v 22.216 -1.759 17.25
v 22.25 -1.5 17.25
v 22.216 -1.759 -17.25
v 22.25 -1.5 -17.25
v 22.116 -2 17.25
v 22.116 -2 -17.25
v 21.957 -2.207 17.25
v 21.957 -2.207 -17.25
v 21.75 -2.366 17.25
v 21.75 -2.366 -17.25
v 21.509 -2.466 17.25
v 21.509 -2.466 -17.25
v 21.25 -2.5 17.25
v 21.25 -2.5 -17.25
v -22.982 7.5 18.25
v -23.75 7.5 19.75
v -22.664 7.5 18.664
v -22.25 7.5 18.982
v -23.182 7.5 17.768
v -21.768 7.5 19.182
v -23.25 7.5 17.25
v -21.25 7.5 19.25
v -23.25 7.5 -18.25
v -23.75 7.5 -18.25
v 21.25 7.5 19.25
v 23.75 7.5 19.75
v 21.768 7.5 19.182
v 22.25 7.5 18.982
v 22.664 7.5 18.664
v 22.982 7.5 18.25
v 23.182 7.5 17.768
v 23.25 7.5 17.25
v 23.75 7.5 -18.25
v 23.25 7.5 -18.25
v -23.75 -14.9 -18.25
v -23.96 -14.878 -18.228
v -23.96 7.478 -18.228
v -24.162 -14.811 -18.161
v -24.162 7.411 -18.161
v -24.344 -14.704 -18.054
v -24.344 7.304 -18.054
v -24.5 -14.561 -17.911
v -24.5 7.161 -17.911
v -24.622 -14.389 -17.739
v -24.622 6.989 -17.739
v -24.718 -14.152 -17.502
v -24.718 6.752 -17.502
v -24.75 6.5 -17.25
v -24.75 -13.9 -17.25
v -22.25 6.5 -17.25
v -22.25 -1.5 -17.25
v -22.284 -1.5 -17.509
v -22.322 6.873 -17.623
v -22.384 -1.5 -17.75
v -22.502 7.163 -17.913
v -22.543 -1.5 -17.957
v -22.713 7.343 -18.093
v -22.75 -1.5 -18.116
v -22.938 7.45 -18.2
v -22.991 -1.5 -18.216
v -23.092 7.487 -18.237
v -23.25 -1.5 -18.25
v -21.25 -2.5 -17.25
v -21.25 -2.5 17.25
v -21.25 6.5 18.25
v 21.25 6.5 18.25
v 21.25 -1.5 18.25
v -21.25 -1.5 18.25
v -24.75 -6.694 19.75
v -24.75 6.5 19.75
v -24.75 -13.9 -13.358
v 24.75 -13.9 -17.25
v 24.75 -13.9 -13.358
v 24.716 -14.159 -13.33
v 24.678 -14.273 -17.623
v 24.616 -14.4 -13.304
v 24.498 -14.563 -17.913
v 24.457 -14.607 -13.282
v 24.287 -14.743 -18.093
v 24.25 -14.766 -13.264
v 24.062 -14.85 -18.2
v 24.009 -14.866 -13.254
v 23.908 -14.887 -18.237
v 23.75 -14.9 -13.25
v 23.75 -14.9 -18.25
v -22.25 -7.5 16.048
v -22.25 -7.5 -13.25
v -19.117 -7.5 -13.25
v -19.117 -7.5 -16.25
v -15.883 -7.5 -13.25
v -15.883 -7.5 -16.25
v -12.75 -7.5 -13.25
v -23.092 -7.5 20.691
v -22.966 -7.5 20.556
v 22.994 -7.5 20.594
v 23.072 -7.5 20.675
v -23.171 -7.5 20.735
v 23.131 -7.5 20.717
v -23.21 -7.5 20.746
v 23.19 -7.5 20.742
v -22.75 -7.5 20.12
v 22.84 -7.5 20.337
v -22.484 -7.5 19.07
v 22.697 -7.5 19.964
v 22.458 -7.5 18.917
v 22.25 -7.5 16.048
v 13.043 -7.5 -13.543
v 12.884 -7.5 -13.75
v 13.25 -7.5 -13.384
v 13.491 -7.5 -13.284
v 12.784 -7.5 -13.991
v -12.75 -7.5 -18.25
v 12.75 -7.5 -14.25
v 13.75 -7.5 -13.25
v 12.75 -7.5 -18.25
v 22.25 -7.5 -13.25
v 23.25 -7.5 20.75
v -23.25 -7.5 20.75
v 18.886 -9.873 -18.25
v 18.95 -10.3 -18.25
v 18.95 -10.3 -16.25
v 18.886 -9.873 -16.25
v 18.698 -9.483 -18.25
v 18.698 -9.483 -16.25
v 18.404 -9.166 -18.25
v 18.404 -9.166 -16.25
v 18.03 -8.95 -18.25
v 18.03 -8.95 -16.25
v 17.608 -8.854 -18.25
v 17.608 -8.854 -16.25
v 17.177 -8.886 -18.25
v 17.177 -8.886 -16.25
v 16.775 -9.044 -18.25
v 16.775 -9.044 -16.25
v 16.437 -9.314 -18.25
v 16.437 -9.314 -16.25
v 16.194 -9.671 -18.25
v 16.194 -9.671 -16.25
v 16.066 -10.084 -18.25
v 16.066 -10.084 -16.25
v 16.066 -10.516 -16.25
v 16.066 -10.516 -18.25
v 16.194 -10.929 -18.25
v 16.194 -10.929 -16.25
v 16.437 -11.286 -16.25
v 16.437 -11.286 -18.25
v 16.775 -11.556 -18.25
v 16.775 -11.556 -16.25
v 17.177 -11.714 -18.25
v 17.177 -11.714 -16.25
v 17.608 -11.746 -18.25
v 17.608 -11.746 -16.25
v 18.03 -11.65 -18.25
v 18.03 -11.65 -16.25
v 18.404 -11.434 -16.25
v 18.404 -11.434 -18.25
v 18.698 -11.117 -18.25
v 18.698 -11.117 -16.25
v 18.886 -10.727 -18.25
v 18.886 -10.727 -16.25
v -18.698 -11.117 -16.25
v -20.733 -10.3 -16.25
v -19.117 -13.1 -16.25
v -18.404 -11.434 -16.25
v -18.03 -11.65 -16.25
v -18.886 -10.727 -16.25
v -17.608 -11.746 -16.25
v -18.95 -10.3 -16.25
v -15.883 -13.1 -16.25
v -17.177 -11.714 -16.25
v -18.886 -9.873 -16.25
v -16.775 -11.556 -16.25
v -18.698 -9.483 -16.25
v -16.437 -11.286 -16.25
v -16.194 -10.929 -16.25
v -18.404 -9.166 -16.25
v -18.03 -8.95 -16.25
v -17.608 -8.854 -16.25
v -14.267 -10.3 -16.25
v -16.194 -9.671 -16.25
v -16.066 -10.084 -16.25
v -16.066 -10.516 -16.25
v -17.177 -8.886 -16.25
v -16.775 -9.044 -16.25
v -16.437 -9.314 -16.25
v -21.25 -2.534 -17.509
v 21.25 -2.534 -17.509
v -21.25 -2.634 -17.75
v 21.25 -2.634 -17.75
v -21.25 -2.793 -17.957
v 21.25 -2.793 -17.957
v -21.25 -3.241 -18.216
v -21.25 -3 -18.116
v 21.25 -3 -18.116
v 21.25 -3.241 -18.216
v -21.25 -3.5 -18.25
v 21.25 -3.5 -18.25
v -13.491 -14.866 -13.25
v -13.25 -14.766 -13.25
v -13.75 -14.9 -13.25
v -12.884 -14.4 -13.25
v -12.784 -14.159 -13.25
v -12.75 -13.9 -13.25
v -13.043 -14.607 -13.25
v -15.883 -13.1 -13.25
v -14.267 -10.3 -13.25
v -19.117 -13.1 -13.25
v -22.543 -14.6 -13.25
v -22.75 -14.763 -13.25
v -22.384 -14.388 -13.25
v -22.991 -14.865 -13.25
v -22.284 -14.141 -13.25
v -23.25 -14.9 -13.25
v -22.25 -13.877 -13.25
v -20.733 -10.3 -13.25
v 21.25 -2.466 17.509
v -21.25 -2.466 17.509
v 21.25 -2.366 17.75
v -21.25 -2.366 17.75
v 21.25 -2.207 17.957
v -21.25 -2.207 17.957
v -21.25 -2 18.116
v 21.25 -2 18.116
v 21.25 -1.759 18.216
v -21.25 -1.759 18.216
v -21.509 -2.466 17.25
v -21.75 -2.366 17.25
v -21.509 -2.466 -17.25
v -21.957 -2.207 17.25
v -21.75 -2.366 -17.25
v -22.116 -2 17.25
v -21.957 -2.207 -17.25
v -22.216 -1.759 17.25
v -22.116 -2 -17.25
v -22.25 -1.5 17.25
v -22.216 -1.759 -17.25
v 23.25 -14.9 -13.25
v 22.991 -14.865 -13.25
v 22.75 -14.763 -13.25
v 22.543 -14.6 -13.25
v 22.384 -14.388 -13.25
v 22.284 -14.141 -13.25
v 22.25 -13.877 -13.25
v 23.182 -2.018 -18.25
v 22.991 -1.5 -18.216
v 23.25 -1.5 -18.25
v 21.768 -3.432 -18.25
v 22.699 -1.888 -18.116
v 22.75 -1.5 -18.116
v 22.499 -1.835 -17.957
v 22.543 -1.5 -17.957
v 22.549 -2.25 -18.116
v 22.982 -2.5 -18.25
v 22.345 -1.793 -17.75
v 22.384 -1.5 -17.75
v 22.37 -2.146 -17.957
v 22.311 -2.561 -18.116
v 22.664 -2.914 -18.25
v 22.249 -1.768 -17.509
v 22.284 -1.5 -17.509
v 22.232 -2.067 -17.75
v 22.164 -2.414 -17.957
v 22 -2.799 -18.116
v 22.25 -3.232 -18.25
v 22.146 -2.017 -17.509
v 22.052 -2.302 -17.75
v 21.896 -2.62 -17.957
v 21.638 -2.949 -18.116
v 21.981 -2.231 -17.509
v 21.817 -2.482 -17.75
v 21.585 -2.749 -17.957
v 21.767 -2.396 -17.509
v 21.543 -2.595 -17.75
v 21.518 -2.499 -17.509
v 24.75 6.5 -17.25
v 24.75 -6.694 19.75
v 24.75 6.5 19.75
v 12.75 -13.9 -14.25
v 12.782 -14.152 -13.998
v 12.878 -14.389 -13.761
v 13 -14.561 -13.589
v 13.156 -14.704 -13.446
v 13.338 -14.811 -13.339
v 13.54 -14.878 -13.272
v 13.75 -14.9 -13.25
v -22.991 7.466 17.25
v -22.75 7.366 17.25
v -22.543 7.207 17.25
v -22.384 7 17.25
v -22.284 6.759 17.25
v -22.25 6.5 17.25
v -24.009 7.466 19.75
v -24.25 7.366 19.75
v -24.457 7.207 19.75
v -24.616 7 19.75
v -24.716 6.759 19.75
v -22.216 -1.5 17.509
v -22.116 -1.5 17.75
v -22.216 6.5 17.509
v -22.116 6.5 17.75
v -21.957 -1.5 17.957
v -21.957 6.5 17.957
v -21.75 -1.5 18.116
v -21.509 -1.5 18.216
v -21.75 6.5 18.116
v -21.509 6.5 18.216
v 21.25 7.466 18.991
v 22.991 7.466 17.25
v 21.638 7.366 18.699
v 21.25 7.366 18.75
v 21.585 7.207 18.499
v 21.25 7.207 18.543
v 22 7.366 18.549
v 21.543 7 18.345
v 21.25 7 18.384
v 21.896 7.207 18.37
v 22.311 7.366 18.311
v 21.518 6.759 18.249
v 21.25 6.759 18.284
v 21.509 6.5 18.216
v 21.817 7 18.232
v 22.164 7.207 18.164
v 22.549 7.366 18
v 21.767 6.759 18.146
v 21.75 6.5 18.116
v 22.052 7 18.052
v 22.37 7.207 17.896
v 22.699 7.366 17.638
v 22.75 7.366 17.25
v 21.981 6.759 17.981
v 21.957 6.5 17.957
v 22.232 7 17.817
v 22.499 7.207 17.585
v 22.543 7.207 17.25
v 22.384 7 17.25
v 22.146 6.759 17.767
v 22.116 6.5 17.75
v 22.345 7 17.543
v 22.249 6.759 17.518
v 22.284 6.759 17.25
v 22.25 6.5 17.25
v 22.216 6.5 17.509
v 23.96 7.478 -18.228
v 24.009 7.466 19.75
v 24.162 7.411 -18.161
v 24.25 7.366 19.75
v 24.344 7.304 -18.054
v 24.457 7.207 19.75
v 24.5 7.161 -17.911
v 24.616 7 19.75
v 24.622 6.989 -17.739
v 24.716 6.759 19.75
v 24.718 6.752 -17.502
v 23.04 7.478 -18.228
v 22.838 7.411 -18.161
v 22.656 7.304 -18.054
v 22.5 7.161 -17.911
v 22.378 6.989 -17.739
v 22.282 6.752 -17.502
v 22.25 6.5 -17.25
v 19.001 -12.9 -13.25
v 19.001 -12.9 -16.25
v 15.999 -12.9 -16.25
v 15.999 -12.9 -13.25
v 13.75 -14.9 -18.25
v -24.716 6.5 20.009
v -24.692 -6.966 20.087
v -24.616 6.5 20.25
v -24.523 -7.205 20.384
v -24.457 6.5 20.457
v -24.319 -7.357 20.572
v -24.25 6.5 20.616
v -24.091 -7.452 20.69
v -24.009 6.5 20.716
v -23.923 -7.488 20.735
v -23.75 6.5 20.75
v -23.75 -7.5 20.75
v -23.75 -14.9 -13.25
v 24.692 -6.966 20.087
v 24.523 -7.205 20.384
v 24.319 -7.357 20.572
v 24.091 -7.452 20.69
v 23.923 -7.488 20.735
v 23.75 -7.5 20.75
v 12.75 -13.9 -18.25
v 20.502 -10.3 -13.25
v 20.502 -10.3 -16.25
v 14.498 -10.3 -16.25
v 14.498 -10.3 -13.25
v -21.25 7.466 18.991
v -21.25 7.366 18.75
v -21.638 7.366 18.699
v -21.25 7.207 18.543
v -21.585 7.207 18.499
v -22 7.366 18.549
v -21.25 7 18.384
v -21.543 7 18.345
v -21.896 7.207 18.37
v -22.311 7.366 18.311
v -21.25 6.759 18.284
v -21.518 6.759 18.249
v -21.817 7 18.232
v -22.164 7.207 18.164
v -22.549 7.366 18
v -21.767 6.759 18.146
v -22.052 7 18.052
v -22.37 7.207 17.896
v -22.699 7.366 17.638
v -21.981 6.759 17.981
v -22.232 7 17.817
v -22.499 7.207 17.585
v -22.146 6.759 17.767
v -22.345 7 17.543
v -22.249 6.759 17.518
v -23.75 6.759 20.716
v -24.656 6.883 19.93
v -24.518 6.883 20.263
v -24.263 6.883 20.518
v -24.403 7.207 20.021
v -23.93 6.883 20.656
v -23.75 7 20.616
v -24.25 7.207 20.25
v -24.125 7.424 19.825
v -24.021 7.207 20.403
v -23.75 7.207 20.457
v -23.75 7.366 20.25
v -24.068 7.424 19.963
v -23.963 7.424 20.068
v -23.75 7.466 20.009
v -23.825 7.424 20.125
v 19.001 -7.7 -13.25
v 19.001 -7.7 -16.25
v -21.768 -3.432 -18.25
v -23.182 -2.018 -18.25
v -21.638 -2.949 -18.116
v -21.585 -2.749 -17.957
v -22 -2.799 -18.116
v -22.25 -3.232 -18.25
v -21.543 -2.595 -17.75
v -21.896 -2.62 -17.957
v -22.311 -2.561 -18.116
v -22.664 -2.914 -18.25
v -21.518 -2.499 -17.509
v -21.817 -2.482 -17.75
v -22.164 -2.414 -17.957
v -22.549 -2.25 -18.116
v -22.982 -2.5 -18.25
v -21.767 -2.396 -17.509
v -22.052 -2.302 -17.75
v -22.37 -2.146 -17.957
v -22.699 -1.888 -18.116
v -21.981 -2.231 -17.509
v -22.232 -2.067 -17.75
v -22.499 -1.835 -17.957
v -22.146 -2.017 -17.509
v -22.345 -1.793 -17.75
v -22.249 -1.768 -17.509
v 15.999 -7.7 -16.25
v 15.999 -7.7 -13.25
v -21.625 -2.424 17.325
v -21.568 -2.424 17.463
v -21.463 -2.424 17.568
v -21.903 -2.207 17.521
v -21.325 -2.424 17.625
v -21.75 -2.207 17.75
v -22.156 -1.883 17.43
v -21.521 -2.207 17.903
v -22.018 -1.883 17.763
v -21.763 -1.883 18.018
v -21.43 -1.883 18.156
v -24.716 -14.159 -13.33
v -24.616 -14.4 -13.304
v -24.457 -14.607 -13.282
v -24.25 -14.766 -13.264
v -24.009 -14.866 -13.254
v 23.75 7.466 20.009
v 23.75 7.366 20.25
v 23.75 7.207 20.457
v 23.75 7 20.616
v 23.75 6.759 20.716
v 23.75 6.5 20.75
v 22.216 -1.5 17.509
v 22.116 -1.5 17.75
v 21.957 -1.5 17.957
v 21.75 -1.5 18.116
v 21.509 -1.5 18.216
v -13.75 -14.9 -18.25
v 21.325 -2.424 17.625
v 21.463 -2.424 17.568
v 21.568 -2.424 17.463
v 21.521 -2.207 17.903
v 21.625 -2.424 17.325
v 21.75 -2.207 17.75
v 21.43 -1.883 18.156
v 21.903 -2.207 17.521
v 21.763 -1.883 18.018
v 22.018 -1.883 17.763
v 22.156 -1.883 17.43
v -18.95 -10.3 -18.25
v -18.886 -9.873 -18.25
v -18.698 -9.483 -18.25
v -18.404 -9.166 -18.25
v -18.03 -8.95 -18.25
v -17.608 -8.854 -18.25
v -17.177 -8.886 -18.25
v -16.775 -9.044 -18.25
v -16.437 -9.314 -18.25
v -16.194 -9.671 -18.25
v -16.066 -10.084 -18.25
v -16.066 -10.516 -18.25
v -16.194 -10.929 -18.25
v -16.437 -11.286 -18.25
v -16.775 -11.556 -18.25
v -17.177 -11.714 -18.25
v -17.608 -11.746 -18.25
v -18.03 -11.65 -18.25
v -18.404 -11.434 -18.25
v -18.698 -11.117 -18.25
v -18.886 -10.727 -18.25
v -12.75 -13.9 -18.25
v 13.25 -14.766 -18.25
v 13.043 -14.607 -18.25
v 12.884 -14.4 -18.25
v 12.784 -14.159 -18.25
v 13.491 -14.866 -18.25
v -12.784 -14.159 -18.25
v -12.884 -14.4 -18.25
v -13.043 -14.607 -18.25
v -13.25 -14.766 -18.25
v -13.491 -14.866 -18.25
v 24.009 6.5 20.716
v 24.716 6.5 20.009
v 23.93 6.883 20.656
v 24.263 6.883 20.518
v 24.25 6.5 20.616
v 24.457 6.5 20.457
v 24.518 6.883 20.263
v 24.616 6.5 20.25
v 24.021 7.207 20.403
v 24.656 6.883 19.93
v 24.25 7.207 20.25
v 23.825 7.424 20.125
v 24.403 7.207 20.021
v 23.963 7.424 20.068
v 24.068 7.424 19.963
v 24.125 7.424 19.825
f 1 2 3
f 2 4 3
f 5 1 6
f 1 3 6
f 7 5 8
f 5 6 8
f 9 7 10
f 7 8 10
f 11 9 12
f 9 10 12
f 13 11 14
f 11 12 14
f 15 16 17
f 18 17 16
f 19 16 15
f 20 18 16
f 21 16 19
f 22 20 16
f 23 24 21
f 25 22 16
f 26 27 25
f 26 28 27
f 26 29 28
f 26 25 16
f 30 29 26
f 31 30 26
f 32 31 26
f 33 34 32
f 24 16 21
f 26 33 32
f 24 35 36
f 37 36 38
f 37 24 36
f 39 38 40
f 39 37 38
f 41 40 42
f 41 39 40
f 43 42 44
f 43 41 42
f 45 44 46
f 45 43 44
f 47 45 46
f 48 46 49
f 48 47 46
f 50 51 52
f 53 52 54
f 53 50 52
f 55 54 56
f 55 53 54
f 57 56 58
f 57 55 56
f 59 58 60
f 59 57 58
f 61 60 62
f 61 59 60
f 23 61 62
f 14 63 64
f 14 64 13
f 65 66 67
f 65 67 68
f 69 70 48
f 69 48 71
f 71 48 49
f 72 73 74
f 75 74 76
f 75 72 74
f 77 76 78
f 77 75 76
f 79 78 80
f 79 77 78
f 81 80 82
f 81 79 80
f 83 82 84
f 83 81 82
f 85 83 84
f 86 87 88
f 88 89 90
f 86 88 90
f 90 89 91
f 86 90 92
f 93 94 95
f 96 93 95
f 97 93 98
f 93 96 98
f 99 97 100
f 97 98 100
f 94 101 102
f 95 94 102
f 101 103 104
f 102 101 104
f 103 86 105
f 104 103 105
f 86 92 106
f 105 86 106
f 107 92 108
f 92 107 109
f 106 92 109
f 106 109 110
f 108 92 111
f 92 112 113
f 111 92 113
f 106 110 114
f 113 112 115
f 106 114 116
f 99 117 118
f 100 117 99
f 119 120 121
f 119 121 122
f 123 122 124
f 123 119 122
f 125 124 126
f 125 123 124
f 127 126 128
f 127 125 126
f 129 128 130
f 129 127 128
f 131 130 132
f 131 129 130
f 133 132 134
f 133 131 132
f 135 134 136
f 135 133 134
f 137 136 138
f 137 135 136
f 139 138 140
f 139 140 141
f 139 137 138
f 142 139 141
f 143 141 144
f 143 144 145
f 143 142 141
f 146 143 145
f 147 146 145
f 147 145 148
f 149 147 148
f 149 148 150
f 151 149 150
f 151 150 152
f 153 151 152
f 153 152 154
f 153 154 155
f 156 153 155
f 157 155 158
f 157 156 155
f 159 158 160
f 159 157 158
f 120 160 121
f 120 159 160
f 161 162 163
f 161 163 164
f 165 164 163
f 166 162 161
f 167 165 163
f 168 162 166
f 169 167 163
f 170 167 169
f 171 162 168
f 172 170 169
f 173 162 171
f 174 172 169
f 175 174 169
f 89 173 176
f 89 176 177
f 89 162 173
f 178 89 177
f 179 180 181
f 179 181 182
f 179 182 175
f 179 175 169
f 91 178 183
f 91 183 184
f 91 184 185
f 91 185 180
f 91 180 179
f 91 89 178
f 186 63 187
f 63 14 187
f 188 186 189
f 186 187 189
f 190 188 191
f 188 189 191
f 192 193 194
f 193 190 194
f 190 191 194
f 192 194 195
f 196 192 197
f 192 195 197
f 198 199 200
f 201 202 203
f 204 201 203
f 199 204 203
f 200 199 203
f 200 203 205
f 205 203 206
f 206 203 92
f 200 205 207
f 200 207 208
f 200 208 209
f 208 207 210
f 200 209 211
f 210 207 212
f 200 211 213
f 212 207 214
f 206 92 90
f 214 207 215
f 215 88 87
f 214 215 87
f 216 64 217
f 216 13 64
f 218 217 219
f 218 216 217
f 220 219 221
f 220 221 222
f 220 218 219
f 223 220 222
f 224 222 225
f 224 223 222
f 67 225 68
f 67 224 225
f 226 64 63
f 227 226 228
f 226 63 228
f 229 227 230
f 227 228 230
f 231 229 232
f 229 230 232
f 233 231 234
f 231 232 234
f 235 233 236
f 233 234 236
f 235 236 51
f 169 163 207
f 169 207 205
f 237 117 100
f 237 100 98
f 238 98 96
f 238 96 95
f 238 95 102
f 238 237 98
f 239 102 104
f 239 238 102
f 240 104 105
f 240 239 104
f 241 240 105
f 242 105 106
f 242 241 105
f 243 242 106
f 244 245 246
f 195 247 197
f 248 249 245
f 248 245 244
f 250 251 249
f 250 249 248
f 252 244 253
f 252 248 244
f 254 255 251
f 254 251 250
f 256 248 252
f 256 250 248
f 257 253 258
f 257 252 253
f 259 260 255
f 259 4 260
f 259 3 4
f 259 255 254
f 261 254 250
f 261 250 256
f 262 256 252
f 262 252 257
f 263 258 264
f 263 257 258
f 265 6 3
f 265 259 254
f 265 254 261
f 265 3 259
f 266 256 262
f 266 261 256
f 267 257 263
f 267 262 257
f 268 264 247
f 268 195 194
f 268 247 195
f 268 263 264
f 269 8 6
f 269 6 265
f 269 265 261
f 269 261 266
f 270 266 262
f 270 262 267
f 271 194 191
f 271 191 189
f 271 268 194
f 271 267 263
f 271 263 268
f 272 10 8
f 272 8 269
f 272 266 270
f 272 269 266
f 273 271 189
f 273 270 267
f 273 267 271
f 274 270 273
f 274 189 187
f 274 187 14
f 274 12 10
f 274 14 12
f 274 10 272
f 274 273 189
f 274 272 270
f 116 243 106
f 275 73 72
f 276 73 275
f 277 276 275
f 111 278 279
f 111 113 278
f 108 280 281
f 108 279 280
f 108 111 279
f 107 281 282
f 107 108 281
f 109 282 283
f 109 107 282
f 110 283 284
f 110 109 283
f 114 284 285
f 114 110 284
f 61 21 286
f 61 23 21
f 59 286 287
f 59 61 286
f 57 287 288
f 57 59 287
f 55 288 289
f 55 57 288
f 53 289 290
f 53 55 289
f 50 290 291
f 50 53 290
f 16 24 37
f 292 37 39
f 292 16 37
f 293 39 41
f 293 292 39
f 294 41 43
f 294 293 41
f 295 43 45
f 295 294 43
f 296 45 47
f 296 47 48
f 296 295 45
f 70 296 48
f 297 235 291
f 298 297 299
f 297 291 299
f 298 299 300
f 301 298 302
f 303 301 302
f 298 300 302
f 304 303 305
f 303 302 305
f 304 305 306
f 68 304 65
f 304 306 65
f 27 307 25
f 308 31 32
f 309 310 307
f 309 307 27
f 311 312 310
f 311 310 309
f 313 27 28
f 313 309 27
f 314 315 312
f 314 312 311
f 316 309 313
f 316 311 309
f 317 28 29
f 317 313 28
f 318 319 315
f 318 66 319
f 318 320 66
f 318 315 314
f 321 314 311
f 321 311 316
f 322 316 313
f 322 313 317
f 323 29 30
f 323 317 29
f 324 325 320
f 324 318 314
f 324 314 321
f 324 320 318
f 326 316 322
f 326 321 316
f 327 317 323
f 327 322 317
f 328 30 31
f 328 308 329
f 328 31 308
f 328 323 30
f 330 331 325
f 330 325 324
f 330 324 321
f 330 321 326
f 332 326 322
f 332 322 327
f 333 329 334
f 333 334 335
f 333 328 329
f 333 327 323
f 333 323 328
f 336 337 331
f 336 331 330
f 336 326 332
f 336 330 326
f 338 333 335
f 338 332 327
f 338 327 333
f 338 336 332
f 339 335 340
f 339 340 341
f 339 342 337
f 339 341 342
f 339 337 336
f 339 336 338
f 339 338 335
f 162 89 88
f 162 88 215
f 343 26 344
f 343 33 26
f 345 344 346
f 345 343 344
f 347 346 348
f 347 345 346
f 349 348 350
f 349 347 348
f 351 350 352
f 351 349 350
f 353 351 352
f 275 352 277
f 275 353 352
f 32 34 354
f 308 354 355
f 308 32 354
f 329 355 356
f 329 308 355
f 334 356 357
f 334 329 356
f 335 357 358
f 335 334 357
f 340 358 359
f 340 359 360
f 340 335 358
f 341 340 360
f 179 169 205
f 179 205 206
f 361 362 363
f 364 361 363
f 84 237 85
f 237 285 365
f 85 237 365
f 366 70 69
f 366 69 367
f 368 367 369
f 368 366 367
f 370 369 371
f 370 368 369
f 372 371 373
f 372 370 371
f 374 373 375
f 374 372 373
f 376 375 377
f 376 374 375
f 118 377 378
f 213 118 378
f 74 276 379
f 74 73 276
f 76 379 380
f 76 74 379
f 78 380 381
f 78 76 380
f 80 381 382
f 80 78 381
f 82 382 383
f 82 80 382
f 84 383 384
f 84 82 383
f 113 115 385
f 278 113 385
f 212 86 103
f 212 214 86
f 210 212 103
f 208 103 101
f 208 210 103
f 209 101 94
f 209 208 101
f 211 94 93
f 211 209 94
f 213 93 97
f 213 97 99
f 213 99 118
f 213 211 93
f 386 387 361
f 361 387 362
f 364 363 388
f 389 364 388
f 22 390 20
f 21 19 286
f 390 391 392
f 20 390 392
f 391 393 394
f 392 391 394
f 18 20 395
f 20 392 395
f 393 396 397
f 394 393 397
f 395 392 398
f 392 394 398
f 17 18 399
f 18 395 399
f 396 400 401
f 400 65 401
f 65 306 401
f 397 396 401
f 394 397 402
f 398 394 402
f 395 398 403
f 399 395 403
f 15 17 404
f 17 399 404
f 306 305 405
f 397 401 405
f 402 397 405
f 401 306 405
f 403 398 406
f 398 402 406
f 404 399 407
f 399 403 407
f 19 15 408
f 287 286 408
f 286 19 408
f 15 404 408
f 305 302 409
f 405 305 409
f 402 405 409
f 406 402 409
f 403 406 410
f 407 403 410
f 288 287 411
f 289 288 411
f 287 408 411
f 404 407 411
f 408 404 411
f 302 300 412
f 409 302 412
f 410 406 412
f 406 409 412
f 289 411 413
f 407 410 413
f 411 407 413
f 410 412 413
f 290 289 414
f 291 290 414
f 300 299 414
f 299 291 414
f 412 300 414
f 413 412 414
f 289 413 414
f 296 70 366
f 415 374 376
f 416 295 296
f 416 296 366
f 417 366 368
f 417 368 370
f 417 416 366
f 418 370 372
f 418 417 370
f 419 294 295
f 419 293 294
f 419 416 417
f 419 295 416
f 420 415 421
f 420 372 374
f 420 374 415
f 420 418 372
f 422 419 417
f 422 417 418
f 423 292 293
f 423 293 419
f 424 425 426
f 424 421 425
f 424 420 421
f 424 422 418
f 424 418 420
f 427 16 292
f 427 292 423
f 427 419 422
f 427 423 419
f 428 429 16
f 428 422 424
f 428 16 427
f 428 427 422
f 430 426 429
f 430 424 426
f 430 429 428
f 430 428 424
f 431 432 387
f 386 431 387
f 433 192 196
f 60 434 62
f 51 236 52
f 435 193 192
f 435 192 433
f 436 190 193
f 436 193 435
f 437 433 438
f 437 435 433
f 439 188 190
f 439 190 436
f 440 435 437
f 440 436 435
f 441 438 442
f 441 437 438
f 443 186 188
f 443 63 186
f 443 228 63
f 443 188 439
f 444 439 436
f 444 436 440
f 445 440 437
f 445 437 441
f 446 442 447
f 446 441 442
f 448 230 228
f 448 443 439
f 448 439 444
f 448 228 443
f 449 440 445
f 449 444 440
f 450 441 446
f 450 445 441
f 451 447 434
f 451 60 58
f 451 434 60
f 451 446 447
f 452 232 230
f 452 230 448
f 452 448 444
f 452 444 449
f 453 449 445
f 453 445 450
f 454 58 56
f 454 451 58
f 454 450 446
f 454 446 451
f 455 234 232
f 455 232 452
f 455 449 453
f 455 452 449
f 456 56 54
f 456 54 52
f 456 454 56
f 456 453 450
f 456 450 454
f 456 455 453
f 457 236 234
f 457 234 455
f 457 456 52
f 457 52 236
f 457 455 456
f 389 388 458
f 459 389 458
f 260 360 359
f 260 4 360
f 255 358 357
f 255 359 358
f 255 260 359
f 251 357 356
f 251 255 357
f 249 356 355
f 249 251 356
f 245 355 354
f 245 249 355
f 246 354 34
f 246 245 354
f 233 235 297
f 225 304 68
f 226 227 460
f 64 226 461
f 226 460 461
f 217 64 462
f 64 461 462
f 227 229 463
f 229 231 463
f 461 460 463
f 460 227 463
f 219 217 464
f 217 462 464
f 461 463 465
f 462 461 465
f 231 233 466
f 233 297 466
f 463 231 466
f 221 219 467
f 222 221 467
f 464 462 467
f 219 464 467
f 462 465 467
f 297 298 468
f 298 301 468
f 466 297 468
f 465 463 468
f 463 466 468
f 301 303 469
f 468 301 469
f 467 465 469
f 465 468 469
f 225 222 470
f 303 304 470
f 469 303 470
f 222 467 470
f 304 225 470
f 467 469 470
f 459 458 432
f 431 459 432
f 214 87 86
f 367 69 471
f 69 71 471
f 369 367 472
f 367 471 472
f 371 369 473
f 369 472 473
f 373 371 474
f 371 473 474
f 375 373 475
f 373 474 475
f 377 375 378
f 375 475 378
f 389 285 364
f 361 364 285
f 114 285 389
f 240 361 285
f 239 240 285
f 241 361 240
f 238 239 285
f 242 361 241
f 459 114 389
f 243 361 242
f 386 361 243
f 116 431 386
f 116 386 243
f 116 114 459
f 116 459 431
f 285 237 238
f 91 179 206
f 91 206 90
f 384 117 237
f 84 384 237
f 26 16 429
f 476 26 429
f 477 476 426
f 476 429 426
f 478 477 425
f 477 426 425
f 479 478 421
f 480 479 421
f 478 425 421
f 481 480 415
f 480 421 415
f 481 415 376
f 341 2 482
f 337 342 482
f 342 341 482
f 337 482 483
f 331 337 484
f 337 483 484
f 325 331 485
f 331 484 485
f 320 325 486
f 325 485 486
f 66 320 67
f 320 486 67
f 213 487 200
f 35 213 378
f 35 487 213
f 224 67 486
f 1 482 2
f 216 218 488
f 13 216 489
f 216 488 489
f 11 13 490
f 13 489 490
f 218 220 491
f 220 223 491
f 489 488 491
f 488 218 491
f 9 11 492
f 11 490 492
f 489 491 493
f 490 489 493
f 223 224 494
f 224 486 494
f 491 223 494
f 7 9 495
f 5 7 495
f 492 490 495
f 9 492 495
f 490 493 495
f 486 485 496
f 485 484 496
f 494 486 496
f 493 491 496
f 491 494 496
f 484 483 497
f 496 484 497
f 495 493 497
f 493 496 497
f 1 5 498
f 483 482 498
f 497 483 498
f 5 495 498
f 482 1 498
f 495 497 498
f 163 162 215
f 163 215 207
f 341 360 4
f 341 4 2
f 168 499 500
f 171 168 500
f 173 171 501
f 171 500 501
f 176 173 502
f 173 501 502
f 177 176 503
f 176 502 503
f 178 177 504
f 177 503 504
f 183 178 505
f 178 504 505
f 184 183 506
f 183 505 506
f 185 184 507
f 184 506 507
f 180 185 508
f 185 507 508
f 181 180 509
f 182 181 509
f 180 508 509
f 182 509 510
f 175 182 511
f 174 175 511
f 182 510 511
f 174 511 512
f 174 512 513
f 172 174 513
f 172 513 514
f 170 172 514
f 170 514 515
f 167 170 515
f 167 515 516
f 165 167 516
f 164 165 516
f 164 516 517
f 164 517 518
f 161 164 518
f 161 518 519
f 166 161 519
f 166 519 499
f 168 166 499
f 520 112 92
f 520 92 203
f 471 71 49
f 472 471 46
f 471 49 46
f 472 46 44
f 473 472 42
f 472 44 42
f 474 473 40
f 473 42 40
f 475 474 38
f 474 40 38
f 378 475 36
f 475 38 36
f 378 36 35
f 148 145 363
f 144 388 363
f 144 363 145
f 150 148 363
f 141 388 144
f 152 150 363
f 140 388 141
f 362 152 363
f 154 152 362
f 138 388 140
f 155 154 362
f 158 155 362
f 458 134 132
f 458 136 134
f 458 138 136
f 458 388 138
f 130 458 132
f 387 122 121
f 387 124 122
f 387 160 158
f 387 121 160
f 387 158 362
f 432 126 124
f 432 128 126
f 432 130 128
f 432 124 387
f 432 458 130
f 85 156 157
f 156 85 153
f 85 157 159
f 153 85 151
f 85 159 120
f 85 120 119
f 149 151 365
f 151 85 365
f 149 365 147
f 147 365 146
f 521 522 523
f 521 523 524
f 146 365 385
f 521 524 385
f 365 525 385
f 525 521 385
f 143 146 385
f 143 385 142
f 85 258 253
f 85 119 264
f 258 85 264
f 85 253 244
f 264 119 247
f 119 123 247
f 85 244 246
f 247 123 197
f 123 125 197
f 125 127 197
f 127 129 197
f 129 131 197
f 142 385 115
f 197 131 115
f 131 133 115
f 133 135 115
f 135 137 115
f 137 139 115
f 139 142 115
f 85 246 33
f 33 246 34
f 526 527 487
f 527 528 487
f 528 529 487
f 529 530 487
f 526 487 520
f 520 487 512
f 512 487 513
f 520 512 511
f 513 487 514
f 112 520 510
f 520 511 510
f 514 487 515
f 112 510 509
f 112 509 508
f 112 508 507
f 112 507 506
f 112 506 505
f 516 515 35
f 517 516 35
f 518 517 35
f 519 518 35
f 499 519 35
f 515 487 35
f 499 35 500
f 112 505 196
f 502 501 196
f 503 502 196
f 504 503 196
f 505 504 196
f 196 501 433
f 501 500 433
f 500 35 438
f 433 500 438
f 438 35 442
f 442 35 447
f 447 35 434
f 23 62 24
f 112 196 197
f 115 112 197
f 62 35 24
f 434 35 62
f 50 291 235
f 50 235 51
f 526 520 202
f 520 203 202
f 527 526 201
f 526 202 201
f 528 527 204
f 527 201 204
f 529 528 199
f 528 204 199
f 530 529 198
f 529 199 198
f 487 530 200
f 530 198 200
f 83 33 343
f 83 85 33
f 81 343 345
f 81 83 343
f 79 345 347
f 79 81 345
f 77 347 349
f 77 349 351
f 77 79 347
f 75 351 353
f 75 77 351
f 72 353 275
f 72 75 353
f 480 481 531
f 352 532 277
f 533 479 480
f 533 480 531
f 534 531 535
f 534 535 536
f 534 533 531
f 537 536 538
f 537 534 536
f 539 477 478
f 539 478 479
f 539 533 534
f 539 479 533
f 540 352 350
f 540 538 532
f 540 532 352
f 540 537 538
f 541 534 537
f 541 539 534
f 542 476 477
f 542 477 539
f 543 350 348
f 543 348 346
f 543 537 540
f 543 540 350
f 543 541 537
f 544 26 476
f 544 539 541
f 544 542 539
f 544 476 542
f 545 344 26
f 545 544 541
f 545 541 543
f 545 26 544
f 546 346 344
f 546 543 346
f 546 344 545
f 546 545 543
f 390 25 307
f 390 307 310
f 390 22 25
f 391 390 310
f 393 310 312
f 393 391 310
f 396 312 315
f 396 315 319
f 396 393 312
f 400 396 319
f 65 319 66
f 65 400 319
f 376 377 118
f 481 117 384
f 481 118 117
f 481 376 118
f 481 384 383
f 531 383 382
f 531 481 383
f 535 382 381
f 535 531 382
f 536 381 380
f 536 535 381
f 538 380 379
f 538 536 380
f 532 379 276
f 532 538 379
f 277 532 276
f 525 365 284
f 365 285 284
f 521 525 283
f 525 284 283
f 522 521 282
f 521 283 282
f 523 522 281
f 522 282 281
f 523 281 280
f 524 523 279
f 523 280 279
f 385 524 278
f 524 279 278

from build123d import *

# Parameters (mm, degrees)
BOSS_EXTRUDE1_DEPTH    = 7.5
BOSS_EXTRUDE2_START    = -7.5
SKETCH1_3_W            = 44.5
SKETCH1_3_H            = 36.5
BOSS_EXTRUDE2_DEPTH    = 5
BOSS_EXTRUDE3_DEPTH    = 2.5
BOSS_EXTRUDE4_DEPTH    = 5
CUT_EXTRUDE1_START     = -5
CUT_EXTRUDE1_DEPTH     = 3
M2_5_CLEARANCE_HOLE1_D = 2.9
MIRROR1_START          = -16.25
MIRROR1_DEPTH          = 3
MIRROR1_START_2        = -18.25
MIRROR1_2_OUTLINE_R    = 1.45
MIRROR1_2_DEPTH        = 2
MIRROR1_3_DEPTH        = 3
MIRROR1_START_3        = 22.25
MIRROR1_4_DEPTH        = 2.5
FILLET1_R              = 1
FILLET2_R              = 1
FILLET6_R              = 1
FILLET7_R              = 1
FILLET8_R              = 1


with BuildPart() as part:
    # Sketch1 → Boss-Extrude1 (new, symmetric)
    with BuildSketch(Plane(origin=(0, 0, 0), x_dir=(1, 0, 0), z_dir=(0, 1, 0))):
        Polygon((22.25, -18.25), (-22.25, -18.25), (-22.25, 18.25), (-24.75, 18.25), (-24.75, -20.75), (24.75, -20.75), (24.75, 18.25), (22.25, 18.25), align=None)
    extrude(amount=BOSS_EXTRUDE1_DEPTH, both=True)

    # Sketch1<3> → Boss-Extrude2 (add)
    with BuildSketch(Plane(origin=(0, 0, 0), x_dir=(1, 0, 0), z_dir=(0, 1, 0)).offset(BOSS_EXTRUDE2_START)):
        Rectangle(SKETCH1_3_W, SKETCH1_3_H)
    extrude(amount=BOSS_EXTRUDE2_DEPTH)

    # Sketch5 → Boss-Extrude3 (add)
    with BuildSketch(Plane(origin=(-24.75, 32.25, 0), x_dir=(0, 1, 0), z_dir=(-1, 0, 0))):
        Polygon((-47.15, 18.25), (-39.75, 18.25), (-39.75, -20.75), (-47.15, 13.25), align=None)
    extrude(amount=-BOSS_EXTRUDE3_DEPTH)

    # Sketch6 → Boss-Extrude4 (add)
    with BuildSketch(Plane(origin=(0, 0, -18.25), x_dir=(-1, 0, 0), z_dir=(0, 0, -1))):
        Polygon((-12.75, -10.3), (-14.266838493, -10.3), (-15.883419246, -13.1), (-19.116580754, -13.1), (-20.733161507, -10.3), (-19.116580754, -7.5), (-22.25, -7.5), (-22.25, -14.9), (-12.75, -14.9), align=None)
        Polygon((22.25, -7.5), (12.75, -7.5), (12.75, -10.3), (12.75, -14.9), (22.25, -14.9), align=None)
    extrude(amount=-BOSS_EXTRUDE4_DEPTH)

    # Sketch6<3> → Cut-Extrude1 (cut)
    with BuildSketch(Plane(origin=(0, 0, -18.25), x_dir=(-1, 0, 0), z_dir=(0, 0, -1)).offset(CUT_EXTRUDE1_START)):
        Polygon((19.0011107, -7.7), (15.9988893, -7.7), (14.4977786, -10.3), (15.9988893, -12.9), (19.0011107, -12.9), (20.5022214, -10.3), align=None)
    extrude(amount=CUT_EXTRUDE1_DEPTH, mode=Mode.SUBTRACT)

    # M2.5 Clearance Hole1 (through all)
    with Locations(Plane.XY.offset(-16.25)):
        with Locations((-17.5, -10.3), (17.5, -10.3)):
            Hole(M2_5_CLEARANCE_HOLE1_D / 2)

    # Mirror1: read off the stored shape, not the designer's step
    # Mirror1 outline → Mirror1 (cut)
    with BuildSketch(Plane.XY.offset(MIRROR1_START)):
        Polygon((-14.266838493, -10.3), (-15.883419246, -7.5), (-19.116580754, -7.5), (-20.733161507, -10.3), (-19.116580754, -13.1), (-15.883419246, -13.1), align=None)
        Polygon((-15.9988893, -12.9), (-19.0011107, -12.9), (-20.5022214, -10.3), (-19.0011107, -7.7), (-15.9988893, -7.7), (-14.4977786, -10.3), align=None, mode=Mode.SUBTRACT)
    extrude(amount=MIRROR1_DEPTH, mode=Mode.SUBTRACT)

    # Mirror1 2 outline → Mirror1 2 (add)
    with BuildSketch(Plane.XY.offset(MIRROR1_START_2)):
        Polygon((20.733161507, -10.3), (19.116580754, -7.5), (12.75, -7.5), (12.75, -10.3), (14.266838493, -10.3), (15.883419246, -13.1), (19.116580754, -13.1), align=None)
        with Locations((17.5, -10.3)):
            Circle(MIRROR1_2_OUTLINE_R, mode=Mode.SUBTRACT)
    extrude(amount=MIRROR1_2_DEPTH)

    # Mirror1 3 outline → Mirror1 3 (add)
    with BuildSketch(Plane.XY.offset(MIRROR1_START)):
        Polygon((20.733161507, -10.3), (19.116580754, -7.5), (12.75, -7.5), (12.75, -10.3), (14.266838493, -10.3), (15.883419246, -13.1), (19.116580754, -13.1), align=None)
        Polygon((15.9988893, -7.7), (19.0011107, -7.7), (20.5022214, -10.3), (19.0011107, -12.9), (15.9988893, -12.9), (14.4977786, -10.3), align=None, mode=Mode.SUBTRACT)
    extrude(amount=MIRROR1_3_DEPTH)

    # Mirror1 4 outline → Mirror1 4 (add)
    with BuildSketch(Plane.YZ.offset(MIRROR1_START_3)):
        Polygon((-14.9, -13.25), (-14.9, -18.25), (-7.5, -18.25), (-7.5, 20.75), align=None)
    extrude(amount=MIRROR1_4_DEPTH)

    # Fillet1
    fillet1_edges = [part.edges().sort_by_distance(p)[0] for p in [
        (22.25, 7.5, 0),
        (-22.25, 2.5, -18.25),
        (-22.25, 2.5, 18.25),
        (22.25, 2.5, 18.25),
        (22.25, 2.5, -18.25),
        (0, 7.5, 18.25),
        (-22.25, 7.5, 0),
        (-22.25, -2.5, 0),
        (0, -2.5, -18.25),
        (0, -2.5, 18.25),
        (22.25, -2.5, 0),
    ]]
    fillet(fillet1_edges, radius=FILLET1_R)

    # Fillet2
    fillet2_edges = [part.edges().sort_by_distance(p)[0] for p in [
        (24.75, -14.9, -15.75),
        (24.75, -11.2, 3.75),
        (24.75, 0, 20.75),
        (-24.75, 0, 20.75),
        (-24.75, -3.7, -18.25),
        (24.75, -3.7, -18.25),
        (-24.75, 7.5, 1.25),
        (-24.75, -14.9, -15.75),
        (-24.75, -11.2, 3.75),
        (24.75, 7.5, 1.25),
    ]]
    fillet(fillet2_edges, radius=FILLET2_R)

    # Fillet6
    fillet6_edges = [part.edges().sort_by_distance(p)[0] for p in [
        (-12.75, -14.9, -15.75),
        (12.75, -14.9, -15.75),
        (12.75, -11.2, -13.25),
    ]]
    fillet(fillet6_edges, radius=FILLET6_R)

    # Fillet7
    # the kernel refuses this fillet: 1 mm, written as the material it takes off along each edge
    with BuildSketch(Plane(origin=(23.75, 6.5, 19.75), x_dir=(0, 0, 1), z_dir=(0, 1, 0))) as fillet7_piece_1_section:
        Polygon((0, 0), (FILLET7_R, 0), (FILLET7_R, FILLET7_R), (0, FILLET7_R), align=None)
    fillet7_piece_1 = extrude(amount=FILLET7_R, mode=Mode.PRIVATE)
    fillet7_piece_1 = fillet7_piece_1 - Plane(origin=(23.75, 6.5, 19.75), x_dir=(-0.7071067811865476, 0, -0.7071067811865475), z_dir=(0, 1, 0)) * Sphere(FILLET7_R, mode=Mode.PRIVATE)
    add(fillet7_piece_1, mode=Mode.SUBTRACT)
    with BuildSketch(Plane(origin=(-23.75, 6.5, 19.75), x_dir=(0, 0, 1), z_dir=(0, 1, 0))) as fillet7_piece_2_section:
        Polygon((0, 0), (FILLET7_R, 0), (FILLET7_R, -FILLET7_R), (0, -FILLET7_R), align=None)
    fillet7_piece_2 = extrude(amount=FILLET7_R, mode=Mode.PRIVATE)
    fillet7_piece_2 = fillet7_piece_2 - Plane(origin=(-23.75, 6.5, 19.75), x_dir=(0.7071067811865475, 0, -0.7071067811865475), z_dir=(0, 1, 0)) * Sphere(FILLET7_R, mode=Mode.PRIVATE)
    add(fillet7_piece_2, mode=Mode.SUBTRACT)
    with BuildSketch(Plane(origin=(-23.75, 7.5, 20.75), x_dir=(0, 0, -1), z_dir=(1, 0, 0))) as fillet7_piece_3:
        with BuildLine():
            CenterArc((FILLET7_R, -FILLET7_R), FILLET7_R, 90, 90)
            Line((0, -FILLET7_R), (0, 0))
            Line((0, 0), (FILLET7_R, 0))
        make_face()
    extrude(amount=47.5, mode=Mode.SUBTRACT)

    # Fillet8
    fillet8_edges = [part.edges().sort_by_distance(p)[0] for p in [
        (22.25, -11.2, 3.75),
        (-22.25, -11.2, 3.75),
    ]]
    fillet(fillet8_edges, radius=FILLET8_R)


solid = part.part
